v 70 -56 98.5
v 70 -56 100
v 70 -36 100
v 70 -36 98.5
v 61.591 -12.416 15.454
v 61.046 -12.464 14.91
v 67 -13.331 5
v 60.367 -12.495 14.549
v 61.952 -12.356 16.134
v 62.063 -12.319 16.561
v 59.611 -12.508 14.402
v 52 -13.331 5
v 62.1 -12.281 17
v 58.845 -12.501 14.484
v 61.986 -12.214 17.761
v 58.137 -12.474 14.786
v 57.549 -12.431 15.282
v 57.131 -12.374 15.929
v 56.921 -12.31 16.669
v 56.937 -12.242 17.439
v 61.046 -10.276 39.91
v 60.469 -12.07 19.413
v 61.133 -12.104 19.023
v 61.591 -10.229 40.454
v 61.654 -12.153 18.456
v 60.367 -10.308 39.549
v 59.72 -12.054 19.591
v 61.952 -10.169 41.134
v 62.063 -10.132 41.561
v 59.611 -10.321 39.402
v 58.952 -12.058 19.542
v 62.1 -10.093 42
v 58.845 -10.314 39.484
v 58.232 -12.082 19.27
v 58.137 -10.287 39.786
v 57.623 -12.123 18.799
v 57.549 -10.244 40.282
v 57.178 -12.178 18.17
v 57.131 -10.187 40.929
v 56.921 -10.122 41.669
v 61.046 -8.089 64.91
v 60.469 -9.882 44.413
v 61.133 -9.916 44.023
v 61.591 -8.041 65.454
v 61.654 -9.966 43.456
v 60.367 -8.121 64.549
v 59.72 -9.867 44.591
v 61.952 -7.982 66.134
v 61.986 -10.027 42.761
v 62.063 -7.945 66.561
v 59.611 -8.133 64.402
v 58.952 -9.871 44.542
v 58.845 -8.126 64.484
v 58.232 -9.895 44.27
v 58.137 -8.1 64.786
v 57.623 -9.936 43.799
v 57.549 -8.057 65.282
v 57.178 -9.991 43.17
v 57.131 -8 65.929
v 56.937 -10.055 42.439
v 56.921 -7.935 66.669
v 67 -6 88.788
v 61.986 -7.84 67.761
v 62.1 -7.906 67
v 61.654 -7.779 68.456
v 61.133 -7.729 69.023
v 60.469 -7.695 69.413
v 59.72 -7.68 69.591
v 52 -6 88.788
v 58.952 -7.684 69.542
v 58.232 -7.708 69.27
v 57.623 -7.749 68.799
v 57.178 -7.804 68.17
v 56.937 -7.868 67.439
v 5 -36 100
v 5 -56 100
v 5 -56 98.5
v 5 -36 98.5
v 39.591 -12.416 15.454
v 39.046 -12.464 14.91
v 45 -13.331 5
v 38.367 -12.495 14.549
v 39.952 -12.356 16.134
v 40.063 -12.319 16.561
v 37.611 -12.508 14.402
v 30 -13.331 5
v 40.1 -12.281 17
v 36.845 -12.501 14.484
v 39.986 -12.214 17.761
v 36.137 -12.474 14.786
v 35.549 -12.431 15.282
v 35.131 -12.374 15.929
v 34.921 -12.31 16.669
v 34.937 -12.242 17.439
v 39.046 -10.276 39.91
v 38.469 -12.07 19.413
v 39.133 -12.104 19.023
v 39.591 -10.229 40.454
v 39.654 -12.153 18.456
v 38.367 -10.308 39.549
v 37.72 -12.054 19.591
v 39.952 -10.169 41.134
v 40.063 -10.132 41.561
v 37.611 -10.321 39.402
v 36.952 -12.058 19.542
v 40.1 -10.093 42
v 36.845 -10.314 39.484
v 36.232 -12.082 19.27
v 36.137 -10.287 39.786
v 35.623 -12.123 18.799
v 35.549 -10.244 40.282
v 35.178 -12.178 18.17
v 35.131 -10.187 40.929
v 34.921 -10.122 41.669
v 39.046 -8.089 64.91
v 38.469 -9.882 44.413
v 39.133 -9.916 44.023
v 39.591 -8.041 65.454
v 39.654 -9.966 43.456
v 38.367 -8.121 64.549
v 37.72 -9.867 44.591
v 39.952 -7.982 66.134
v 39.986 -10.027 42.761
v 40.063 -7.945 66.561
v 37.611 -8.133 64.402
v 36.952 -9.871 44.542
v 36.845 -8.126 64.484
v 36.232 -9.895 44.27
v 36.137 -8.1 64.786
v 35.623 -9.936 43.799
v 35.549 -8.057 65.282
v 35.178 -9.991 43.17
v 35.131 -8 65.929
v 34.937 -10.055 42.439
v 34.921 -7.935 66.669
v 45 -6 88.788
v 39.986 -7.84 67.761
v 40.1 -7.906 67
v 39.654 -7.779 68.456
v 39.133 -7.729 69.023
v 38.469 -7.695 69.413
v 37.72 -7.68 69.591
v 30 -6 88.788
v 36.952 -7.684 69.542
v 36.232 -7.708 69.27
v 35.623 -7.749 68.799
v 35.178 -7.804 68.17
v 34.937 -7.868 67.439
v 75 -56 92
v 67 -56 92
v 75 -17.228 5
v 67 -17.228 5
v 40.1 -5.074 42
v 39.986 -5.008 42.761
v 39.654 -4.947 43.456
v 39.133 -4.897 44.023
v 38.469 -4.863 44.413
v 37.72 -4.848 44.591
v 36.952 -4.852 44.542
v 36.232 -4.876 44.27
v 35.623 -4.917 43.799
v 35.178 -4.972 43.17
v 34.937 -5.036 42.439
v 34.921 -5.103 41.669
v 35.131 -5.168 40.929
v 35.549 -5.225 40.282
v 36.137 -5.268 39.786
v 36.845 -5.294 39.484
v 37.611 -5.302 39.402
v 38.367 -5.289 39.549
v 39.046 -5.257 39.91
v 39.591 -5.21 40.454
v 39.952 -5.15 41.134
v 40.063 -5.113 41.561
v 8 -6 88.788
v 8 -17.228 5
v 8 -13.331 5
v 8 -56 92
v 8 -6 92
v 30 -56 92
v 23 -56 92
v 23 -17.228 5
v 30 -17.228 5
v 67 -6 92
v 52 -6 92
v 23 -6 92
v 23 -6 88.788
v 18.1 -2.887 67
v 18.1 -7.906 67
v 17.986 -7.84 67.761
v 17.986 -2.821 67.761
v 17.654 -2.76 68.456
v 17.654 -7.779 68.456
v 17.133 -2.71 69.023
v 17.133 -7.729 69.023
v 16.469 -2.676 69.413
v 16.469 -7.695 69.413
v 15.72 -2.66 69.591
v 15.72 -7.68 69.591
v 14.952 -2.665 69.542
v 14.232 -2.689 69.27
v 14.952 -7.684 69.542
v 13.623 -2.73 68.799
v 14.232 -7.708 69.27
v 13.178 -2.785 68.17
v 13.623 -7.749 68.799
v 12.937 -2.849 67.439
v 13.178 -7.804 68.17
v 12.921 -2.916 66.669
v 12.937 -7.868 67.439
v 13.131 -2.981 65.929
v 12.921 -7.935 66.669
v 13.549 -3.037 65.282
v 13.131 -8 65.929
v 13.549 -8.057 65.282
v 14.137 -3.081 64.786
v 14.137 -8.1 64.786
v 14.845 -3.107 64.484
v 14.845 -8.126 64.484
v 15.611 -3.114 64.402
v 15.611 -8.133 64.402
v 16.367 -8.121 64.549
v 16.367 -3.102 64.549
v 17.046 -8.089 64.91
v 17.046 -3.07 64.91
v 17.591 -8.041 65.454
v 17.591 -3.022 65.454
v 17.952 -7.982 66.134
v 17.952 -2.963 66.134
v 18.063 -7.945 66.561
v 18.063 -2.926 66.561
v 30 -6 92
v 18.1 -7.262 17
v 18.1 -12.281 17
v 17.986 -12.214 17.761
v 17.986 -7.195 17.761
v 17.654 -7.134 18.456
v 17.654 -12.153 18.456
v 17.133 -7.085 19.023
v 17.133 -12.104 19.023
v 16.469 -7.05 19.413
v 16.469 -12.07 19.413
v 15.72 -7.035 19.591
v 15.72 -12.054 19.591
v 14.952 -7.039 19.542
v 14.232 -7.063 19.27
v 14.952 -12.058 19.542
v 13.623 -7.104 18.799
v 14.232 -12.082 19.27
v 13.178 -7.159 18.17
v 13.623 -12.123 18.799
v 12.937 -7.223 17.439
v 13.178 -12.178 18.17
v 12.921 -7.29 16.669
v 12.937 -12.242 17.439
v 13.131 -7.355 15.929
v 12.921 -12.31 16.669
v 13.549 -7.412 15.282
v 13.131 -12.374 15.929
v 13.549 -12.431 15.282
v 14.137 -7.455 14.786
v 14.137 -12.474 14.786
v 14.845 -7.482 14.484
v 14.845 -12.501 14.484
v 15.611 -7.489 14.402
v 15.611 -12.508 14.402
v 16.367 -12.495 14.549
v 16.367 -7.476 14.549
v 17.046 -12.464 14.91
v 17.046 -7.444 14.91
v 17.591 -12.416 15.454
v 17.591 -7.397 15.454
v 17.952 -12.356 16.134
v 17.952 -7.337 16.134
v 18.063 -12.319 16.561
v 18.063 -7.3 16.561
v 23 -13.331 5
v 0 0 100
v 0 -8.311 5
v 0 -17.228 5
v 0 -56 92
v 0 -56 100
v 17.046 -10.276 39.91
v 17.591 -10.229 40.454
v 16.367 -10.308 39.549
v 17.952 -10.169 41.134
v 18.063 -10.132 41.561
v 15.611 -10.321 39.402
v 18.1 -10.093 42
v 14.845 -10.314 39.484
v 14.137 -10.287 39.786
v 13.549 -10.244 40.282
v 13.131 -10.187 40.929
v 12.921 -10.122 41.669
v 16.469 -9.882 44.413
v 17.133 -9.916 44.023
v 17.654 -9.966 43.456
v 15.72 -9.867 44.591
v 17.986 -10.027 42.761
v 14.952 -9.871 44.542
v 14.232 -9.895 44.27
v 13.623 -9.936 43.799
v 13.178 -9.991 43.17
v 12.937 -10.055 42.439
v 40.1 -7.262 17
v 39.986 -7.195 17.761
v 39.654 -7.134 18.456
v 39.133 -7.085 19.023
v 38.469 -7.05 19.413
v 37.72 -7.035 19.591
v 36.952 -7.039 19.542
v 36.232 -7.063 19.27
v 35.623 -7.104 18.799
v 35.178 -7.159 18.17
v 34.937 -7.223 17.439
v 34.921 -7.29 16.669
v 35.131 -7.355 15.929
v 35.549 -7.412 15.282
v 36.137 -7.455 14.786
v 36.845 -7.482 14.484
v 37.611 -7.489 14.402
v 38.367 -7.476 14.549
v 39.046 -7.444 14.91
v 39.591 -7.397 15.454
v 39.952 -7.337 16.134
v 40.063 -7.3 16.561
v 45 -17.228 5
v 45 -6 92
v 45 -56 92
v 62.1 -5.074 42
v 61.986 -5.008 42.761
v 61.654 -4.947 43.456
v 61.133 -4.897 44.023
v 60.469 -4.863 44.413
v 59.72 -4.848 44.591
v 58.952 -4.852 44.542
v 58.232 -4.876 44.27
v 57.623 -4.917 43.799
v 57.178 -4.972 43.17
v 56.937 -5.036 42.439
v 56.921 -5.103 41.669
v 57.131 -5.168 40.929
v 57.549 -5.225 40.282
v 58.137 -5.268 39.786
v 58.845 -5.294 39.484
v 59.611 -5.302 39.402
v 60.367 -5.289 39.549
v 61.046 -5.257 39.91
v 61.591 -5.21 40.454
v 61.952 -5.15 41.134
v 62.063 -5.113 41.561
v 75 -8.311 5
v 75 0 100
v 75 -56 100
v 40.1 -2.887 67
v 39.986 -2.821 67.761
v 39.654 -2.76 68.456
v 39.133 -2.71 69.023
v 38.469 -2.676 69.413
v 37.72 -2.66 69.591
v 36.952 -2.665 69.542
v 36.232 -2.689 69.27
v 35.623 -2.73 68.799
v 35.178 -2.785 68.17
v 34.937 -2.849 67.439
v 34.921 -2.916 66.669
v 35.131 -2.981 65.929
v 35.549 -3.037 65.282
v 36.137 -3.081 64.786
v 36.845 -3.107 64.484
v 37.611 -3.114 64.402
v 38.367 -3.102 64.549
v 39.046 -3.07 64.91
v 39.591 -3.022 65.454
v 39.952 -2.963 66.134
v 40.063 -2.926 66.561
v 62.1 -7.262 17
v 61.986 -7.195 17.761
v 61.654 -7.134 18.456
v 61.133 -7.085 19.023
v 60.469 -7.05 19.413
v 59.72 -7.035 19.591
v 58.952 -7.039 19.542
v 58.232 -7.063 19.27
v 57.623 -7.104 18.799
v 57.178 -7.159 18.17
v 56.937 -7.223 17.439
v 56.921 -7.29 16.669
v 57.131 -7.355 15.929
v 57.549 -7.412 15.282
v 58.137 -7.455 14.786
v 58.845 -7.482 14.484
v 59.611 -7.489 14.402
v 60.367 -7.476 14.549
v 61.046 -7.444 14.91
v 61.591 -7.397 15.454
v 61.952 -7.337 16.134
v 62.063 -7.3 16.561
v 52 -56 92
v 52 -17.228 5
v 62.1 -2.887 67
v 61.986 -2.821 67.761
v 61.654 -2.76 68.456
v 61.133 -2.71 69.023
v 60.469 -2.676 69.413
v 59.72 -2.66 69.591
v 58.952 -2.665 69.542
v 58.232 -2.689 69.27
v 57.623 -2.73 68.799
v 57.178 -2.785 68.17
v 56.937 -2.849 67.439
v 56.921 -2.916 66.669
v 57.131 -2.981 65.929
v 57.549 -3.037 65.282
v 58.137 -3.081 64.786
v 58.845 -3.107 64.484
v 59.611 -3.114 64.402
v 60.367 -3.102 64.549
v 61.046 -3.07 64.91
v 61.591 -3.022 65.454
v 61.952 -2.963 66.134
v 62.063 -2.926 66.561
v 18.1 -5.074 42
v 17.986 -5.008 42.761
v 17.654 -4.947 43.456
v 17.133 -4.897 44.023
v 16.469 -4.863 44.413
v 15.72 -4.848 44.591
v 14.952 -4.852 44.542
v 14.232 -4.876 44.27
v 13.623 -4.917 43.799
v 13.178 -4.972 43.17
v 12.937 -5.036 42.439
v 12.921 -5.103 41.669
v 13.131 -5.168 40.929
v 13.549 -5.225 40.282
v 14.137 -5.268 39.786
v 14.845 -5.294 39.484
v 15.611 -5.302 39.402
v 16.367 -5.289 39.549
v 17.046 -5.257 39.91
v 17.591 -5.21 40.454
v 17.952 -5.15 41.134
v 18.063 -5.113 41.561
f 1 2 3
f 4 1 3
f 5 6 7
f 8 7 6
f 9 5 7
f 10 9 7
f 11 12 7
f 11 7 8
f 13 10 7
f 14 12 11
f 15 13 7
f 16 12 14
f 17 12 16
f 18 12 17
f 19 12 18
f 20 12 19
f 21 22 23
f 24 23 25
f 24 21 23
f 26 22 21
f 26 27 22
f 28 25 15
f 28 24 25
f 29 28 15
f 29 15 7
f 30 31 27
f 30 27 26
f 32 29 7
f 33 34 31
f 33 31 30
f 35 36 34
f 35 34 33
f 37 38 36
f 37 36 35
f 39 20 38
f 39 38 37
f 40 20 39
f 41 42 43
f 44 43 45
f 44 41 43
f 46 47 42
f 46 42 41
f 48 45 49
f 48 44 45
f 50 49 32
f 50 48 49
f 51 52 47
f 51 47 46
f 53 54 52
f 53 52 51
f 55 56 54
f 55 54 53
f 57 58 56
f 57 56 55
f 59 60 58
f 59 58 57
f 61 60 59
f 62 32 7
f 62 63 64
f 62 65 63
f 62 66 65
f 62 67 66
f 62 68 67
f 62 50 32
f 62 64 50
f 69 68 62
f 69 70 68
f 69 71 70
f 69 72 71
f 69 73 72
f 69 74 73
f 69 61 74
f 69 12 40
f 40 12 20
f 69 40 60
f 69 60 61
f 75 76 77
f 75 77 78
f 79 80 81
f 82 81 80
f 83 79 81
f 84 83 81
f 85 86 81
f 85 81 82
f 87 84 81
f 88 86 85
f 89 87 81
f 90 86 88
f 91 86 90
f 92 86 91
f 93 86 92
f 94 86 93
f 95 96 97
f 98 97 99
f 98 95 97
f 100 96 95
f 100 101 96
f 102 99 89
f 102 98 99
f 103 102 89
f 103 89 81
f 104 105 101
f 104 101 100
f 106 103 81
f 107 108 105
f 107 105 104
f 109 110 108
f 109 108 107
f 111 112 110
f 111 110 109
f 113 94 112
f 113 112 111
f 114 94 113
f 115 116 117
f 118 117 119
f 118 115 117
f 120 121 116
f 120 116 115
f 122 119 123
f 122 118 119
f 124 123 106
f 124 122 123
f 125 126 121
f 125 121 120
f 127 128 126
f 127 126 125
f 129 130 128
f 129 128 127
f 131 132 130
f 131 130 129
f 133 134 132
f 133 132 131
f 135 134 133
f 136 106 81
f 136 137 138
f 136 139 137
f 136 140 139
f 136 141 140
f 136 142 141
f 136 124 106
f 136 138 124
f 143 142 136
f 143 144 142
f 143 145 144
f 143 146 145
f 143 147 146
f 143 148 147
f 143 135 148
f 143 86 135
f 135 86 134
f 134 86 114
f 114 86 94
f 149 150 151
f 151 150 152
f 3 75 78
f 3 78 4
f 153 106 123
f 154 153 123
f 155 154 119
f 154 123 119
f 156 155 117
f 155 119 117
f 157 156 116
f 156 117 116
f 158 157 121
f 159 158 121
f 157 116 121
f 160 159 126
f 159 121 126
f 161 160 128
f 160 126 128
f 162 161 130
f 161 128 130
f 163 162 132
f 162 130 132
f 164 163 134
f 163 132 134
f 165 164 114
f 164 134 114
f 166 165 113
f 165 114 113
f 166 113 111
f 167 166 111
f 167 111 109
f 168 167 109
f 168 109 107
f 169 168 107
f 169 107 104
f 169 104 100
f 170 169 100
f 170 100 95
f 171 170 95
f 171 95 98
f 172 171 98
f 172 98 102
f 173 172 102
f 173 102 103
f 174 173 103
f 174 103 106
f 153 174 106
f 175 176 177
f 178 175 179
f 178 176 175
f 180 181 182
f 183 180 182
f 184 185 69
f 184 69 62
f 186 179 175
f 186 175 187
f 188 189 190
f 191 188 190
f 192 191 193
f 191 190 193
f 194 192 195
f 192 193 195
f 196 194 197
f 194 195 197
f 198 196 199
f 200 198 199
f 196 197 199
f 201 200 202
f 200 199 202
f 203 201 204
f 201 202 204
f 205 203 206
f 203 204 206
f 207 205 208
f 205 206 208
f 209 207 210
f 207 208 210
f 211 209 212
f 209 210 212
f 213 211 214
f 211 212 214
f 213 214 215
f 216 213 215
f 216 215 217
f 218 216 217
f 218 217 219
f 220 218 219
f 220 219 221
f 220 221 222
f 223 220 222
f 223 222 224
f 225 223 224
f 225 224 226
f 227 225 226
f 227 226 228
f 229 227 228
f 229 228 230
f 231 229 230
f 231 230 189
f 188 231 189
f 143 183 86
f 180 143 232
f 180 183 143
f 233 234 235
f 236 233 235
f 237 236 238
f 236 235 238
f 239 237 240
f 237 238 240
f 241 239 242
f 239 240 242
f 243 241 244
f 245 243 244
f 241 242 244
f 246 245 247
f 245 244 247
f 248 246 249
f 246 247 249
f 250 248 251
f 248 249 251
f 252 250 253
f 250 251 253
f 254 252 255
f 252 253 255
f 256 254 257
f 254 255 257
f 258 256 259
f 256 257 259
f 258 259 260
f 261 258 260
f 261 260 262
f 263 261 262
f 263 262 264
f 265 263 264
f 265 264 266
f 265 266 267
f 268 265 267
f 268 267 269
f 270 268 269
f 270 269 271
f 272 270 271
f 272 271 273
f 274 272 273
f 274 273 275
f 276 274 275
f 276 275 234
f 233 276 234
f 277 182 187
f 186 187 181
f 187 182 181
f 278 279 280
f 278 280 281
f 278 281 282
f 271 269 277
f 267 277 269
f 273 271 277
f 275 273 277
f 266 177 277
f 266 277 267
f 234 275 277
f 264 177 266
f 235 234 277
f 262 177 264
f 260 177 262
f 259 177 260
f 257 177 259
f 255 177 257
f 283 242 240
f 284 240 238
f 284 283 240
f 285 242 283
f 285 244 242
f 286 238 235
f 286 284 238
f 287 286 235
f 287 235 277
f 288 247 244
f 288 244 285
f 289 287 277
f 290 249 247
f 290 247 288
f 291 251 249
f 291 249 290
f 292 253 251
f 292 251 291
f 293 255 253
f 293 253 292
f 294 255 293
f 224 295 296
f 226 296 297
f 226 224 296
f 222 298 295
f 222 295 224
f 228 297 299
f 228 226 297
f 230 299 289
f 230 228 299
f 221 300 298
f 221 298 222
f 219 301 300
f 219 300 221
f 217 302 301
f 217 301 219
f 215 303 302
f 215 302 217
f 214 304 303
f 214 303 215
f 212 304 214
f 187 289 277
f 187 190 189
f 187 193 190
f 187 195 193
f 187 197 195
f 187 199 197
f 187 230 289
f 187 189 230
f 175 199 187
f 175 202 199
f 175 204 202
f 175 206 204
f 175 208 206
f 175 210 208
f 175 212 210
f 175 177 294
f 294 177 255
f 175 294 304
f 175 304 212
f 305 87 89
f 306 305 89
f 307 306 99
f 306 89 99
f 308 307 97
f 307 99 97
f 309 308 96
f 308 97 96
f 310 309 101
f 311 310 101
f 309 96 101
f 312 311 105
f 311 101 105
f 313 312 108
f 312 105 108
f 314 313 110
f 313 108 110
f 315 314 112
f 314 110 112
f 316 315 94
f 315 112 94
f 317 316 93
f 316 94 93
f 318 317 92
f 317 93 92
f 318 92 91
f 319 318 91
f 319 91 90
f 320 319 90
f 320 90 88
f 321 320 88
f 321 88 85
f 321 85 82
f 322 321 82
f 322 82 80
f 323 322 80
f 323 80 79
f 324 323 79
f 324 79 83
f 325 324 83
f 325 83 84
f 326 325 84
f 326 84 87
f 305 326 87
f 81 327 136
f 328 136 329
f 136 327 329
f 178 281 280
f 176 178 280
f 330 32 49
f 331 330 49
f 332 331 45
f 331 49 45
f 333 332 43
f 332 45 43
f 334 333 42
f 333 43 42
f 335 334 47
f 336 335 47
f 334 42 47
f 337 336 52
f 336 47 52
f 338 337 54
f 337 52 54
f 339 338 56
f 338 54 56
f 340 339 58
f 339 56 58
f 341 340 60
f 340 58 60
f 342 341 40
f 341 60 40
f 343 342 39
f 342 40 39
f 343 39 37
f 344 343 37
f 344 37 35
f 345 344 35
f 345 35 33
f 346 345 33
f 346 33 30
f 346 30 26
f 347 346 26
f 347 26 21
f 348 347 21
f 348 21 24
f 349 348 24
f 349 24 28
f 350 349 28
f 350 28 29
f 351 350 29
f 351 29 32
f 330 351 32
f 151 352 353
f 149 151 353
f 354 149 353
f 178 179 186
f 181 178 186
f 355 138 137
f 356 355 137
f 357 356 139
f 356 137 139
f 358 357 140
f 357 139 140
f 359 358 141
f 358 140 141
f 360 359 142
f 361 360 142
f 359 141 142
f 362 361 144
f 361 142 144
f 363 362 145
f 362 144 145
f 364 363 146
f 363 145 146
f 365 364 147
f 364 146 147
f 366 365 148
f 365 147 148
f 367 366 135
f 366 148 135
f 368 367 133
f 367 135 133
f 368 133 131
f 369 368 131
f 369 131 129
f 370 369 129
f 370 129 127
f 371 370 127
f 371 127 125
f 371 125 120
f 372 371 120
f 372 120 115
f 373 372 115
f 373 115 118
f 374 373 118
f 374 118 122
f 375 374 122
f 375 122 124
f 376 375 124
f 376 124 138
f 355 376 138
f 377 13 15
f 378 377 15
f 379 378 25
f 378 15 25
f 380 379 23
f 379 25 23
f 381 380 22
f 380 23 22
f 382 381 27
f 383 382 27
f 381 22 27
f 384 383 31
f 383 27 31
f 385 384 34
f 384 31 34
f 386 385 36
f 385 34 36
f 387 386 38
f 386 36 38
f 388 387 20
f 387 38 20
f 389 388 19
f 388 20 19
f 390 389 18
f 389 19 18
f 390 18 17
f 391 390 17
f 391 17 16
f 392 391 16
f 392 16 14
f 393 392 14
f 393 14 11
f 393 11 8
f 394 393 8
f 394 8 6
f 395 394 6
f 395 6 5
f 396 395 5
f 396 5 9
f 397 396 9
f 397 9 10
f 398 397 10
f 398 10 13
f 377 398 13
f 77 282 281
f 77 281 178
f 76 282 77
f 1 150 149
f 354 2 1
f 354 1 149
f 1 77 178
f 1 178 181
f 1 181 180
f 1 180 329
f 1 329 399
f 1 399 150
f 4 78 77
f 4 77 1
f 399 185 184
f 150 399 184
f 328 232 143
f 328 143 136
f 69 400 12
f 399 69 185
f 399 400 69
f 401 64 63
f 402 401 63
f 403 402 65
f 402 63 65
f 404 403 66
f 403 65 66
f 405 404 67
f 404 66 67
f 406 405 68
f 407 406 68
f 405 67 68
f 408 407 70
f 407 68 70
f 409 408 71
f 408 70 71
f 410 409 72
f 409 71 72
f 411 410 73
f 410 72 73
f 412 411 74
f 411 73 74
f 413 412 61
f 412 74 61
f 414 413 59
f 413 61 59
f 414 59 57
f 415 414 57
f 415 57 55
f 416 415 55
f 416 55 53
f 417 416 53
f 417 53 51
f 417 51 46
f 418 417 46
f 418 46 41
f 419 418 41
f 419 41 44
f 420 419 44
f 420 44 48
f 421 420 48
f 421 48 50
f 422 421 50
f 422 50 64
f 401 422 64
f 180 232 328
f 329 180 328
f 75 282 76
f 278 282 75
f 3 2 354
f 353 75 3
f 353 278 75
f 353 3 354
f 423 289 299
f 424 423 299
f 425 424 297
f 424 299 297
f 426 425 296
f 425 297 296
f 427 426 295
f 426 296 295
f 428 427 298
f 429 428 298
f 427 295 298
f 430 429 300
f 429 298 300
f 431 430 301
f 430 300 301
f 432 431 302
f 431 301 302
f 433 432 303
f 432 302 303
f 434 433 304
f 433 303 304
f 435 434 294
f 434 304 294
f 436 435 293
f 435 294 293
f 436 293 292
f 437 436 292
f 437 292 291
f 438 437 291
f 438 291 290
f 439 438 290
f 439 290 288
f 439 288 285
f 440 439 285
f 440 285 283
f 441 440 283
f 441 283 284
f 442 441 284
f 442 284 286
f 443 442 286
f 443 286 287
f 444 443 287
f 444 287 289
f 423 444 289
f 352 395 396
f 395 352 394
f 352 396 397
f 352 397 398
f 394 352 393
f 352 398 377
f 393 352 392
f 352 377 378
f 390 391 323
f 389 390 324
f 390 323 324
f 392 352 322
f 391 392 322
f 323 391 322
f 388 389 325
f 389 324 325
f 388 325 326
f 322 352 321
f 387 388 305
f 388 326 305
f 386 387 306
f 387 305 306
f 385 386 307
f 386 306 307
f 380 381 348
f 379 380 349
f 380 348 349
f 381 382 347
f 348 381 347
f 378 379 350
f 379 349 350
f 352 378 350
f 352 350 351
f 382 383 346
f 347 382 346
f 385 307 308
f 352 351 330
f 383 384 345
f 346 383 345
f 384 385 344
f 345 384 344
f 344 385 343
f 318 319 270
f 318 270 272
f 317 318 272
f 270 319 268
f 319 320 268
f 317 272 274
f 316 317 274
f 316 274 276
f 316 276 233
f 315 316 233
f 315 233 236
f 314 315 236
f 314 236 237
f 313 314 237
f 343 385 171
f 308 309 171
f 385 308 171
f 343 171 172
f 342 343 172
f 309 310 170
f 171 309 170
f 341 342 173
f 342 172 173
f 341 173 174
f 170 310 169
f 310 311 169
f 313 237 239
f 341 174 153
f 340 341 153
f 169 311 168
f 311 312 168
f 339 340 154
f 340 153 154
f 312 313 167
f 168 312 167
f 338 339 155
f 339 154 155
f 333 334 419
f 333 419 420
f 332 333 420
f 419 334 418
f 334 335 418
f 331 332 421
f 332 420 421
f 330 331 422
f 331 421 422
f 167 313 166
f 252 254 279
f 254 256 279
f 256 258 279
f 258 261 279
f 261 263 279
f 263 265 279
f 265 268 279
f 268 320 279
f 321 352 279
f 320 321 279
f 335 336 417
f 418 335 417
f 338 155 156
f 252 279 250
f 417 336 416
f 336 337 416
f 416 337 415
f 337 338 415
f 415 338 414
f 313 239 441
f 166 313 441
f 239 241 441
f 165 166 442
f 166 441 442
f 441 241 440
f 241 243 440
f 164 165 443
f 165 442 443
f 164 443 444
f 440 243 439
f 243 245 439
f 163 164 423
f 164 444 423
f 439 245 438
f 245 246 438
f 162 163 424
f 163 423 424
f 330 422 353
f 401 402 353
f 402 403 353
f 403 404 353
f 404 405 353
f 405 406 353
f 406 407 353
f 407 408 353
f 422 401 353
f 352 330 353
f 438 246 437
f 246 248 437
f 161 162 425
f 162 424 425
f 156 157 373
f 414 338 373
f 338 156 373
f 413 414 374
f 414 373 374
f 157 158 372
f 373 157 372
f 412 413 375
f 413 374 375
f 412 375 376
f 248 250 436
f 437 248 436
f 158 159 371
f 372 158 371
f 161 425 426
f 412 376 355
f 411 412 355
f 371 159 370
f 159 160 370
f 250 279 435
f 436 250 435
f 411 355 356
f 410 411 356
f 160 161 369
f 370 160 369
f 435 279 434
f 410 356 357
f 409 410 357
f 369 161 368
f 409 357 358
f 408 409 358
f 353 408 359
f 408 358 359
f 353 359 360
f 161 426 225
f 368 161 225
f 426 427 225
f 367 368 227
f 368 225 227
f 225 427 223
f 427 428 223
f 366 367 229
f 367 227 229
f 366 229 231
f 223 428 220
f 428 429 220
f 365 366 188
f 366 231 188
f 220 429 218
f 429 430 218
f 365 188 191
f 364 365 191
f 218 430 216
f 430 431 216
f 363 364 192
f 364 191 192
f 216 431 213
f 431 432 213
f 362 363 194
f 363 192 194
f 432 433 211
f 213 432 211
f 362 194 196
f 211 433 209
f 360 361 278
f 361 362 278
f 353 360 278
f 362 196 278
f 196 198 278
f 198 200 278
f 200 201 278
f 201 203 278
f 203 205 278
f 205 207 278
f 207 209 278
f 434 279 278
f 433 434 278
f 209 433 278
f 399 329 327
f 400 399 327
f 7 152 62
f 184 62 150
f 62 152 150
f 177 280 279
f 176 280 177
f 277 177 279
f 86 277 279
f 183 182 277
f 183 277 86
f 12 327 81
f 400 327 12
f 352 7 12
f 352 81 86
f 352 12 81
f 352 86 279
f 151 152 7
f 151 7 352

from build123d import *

# Parameters (mm, degrees)
F0_W      = 75
F0_H      = 100
F1_DEPTH  = 56
F3_DEPTH  = 75.001
F4_W      = 15
F4_H      = 92
F5_DEPTH  = 50
F6_W      = 65
F6_H      = 20
F7_DEPTH  = 1.5
F9_DEPTH  = 75.001
F11_DEPTH = 75
F12_W     = 75
F12_H     = 5
F12_R     = 2.6
F13_DEPTH = 56.001


with BuildPart() as f1:
    # F0 (on Front) → F1 (new body)
    with BuildSketch(Plane.XZ):
        with Locations((37.5, 50)):
            Rectangle(F0_W, F0_H)
    extrude(amount=F1_DEPTH)

    # F2 (on face) → F3 (cut, through all)
    with BuildSketch(Plane(origin=(0, 0, 0), x_dir=(0, -1, 0), z_dir=(-1, 0, 0))):
        Polygon((56, 92), (15, 0), (56, 0), align=None)
    extrude(amount=-F3_DEPTH, mode=Mode.SUBTRACT)

    # F4 (on face) → F5 (cut)
    with BuildSketch(Plane.XZ.offset(56)):
        with Locations((15.5, 46)):
            Rectangle(F4_W, F4_H)
        with Locations((37.5, 46)):
            Rectangle(F4_W, F4_H)
        with Locations((59.5, 46)):
            Rectangle(F4_W, F4_H)
    extrude(amount=-F5_DEPTH, mode=Mode.SUBTRACT)

    # F6 (on face) → F7 (cut)
    with BuildSketch(Plane.XY.offset(100)):
        with Locations((37.5, -46)):
            Rectangle(F6_W, F6_H)
    extrude(amount=-F7_DEPTH, mode=Mode.SUBTRACT)

    # F8 (on face) → F9 (cut, through all)
    with BuildSketch(Plane(origin=(0, 0, 0), x_dir=(0, -1, 0), z_dir=(-1, 0, 0))):
        Polygon((8.748866, 0), (0, 100), (0, 0), align=None)
    extrude(amount=-F9_DEPTH, mode=Mode.SUBTRACT)

    # F10 (on face) → F11 (join, through all)
    with BuildSketch(Plane(origin=(0, 0, 0), x_dir=(0, -1, 0), z_dir=(-1, 0, 0))):
        Polygon((5.019099, 100), (0, 100), (8.748866, 0), (13.767966, 0), align=None)
    extrude(amount=-F11_DEPTH)

    # F12 (on face) → F13 (cut, through all)
    with BuildSketch(Plane.XZ.offset(56)):
        with Locations((37.5, 2.5)):
            Rectangle(F12_W, F12_H)
        with Locations((15.5, 17)):
            Circle(F12_R)
        with Locations((15.5, 42)):
            Circle(F12_R)
        with Locations((15.5, 67)):
            Circle(F12_R)
        with Locations((37.5, 67)):
            Circle(F12_R)
        with Locations((37.5, 42)):
            Circle(F12_R)
        with Locations((37.5, 17)):
            Circle(F12_R)
        with Locations((59.5, 17)):
            Circle(F12_R)
        with Locations((59.5, 42)):
            Circle(F12_R)
        with Locations((59.5, 67)):
            Circle(F12_R)
    extrude(amount=-F13_DEPTH, mode=Mode.SUBTRACT)


solid = f1.part
